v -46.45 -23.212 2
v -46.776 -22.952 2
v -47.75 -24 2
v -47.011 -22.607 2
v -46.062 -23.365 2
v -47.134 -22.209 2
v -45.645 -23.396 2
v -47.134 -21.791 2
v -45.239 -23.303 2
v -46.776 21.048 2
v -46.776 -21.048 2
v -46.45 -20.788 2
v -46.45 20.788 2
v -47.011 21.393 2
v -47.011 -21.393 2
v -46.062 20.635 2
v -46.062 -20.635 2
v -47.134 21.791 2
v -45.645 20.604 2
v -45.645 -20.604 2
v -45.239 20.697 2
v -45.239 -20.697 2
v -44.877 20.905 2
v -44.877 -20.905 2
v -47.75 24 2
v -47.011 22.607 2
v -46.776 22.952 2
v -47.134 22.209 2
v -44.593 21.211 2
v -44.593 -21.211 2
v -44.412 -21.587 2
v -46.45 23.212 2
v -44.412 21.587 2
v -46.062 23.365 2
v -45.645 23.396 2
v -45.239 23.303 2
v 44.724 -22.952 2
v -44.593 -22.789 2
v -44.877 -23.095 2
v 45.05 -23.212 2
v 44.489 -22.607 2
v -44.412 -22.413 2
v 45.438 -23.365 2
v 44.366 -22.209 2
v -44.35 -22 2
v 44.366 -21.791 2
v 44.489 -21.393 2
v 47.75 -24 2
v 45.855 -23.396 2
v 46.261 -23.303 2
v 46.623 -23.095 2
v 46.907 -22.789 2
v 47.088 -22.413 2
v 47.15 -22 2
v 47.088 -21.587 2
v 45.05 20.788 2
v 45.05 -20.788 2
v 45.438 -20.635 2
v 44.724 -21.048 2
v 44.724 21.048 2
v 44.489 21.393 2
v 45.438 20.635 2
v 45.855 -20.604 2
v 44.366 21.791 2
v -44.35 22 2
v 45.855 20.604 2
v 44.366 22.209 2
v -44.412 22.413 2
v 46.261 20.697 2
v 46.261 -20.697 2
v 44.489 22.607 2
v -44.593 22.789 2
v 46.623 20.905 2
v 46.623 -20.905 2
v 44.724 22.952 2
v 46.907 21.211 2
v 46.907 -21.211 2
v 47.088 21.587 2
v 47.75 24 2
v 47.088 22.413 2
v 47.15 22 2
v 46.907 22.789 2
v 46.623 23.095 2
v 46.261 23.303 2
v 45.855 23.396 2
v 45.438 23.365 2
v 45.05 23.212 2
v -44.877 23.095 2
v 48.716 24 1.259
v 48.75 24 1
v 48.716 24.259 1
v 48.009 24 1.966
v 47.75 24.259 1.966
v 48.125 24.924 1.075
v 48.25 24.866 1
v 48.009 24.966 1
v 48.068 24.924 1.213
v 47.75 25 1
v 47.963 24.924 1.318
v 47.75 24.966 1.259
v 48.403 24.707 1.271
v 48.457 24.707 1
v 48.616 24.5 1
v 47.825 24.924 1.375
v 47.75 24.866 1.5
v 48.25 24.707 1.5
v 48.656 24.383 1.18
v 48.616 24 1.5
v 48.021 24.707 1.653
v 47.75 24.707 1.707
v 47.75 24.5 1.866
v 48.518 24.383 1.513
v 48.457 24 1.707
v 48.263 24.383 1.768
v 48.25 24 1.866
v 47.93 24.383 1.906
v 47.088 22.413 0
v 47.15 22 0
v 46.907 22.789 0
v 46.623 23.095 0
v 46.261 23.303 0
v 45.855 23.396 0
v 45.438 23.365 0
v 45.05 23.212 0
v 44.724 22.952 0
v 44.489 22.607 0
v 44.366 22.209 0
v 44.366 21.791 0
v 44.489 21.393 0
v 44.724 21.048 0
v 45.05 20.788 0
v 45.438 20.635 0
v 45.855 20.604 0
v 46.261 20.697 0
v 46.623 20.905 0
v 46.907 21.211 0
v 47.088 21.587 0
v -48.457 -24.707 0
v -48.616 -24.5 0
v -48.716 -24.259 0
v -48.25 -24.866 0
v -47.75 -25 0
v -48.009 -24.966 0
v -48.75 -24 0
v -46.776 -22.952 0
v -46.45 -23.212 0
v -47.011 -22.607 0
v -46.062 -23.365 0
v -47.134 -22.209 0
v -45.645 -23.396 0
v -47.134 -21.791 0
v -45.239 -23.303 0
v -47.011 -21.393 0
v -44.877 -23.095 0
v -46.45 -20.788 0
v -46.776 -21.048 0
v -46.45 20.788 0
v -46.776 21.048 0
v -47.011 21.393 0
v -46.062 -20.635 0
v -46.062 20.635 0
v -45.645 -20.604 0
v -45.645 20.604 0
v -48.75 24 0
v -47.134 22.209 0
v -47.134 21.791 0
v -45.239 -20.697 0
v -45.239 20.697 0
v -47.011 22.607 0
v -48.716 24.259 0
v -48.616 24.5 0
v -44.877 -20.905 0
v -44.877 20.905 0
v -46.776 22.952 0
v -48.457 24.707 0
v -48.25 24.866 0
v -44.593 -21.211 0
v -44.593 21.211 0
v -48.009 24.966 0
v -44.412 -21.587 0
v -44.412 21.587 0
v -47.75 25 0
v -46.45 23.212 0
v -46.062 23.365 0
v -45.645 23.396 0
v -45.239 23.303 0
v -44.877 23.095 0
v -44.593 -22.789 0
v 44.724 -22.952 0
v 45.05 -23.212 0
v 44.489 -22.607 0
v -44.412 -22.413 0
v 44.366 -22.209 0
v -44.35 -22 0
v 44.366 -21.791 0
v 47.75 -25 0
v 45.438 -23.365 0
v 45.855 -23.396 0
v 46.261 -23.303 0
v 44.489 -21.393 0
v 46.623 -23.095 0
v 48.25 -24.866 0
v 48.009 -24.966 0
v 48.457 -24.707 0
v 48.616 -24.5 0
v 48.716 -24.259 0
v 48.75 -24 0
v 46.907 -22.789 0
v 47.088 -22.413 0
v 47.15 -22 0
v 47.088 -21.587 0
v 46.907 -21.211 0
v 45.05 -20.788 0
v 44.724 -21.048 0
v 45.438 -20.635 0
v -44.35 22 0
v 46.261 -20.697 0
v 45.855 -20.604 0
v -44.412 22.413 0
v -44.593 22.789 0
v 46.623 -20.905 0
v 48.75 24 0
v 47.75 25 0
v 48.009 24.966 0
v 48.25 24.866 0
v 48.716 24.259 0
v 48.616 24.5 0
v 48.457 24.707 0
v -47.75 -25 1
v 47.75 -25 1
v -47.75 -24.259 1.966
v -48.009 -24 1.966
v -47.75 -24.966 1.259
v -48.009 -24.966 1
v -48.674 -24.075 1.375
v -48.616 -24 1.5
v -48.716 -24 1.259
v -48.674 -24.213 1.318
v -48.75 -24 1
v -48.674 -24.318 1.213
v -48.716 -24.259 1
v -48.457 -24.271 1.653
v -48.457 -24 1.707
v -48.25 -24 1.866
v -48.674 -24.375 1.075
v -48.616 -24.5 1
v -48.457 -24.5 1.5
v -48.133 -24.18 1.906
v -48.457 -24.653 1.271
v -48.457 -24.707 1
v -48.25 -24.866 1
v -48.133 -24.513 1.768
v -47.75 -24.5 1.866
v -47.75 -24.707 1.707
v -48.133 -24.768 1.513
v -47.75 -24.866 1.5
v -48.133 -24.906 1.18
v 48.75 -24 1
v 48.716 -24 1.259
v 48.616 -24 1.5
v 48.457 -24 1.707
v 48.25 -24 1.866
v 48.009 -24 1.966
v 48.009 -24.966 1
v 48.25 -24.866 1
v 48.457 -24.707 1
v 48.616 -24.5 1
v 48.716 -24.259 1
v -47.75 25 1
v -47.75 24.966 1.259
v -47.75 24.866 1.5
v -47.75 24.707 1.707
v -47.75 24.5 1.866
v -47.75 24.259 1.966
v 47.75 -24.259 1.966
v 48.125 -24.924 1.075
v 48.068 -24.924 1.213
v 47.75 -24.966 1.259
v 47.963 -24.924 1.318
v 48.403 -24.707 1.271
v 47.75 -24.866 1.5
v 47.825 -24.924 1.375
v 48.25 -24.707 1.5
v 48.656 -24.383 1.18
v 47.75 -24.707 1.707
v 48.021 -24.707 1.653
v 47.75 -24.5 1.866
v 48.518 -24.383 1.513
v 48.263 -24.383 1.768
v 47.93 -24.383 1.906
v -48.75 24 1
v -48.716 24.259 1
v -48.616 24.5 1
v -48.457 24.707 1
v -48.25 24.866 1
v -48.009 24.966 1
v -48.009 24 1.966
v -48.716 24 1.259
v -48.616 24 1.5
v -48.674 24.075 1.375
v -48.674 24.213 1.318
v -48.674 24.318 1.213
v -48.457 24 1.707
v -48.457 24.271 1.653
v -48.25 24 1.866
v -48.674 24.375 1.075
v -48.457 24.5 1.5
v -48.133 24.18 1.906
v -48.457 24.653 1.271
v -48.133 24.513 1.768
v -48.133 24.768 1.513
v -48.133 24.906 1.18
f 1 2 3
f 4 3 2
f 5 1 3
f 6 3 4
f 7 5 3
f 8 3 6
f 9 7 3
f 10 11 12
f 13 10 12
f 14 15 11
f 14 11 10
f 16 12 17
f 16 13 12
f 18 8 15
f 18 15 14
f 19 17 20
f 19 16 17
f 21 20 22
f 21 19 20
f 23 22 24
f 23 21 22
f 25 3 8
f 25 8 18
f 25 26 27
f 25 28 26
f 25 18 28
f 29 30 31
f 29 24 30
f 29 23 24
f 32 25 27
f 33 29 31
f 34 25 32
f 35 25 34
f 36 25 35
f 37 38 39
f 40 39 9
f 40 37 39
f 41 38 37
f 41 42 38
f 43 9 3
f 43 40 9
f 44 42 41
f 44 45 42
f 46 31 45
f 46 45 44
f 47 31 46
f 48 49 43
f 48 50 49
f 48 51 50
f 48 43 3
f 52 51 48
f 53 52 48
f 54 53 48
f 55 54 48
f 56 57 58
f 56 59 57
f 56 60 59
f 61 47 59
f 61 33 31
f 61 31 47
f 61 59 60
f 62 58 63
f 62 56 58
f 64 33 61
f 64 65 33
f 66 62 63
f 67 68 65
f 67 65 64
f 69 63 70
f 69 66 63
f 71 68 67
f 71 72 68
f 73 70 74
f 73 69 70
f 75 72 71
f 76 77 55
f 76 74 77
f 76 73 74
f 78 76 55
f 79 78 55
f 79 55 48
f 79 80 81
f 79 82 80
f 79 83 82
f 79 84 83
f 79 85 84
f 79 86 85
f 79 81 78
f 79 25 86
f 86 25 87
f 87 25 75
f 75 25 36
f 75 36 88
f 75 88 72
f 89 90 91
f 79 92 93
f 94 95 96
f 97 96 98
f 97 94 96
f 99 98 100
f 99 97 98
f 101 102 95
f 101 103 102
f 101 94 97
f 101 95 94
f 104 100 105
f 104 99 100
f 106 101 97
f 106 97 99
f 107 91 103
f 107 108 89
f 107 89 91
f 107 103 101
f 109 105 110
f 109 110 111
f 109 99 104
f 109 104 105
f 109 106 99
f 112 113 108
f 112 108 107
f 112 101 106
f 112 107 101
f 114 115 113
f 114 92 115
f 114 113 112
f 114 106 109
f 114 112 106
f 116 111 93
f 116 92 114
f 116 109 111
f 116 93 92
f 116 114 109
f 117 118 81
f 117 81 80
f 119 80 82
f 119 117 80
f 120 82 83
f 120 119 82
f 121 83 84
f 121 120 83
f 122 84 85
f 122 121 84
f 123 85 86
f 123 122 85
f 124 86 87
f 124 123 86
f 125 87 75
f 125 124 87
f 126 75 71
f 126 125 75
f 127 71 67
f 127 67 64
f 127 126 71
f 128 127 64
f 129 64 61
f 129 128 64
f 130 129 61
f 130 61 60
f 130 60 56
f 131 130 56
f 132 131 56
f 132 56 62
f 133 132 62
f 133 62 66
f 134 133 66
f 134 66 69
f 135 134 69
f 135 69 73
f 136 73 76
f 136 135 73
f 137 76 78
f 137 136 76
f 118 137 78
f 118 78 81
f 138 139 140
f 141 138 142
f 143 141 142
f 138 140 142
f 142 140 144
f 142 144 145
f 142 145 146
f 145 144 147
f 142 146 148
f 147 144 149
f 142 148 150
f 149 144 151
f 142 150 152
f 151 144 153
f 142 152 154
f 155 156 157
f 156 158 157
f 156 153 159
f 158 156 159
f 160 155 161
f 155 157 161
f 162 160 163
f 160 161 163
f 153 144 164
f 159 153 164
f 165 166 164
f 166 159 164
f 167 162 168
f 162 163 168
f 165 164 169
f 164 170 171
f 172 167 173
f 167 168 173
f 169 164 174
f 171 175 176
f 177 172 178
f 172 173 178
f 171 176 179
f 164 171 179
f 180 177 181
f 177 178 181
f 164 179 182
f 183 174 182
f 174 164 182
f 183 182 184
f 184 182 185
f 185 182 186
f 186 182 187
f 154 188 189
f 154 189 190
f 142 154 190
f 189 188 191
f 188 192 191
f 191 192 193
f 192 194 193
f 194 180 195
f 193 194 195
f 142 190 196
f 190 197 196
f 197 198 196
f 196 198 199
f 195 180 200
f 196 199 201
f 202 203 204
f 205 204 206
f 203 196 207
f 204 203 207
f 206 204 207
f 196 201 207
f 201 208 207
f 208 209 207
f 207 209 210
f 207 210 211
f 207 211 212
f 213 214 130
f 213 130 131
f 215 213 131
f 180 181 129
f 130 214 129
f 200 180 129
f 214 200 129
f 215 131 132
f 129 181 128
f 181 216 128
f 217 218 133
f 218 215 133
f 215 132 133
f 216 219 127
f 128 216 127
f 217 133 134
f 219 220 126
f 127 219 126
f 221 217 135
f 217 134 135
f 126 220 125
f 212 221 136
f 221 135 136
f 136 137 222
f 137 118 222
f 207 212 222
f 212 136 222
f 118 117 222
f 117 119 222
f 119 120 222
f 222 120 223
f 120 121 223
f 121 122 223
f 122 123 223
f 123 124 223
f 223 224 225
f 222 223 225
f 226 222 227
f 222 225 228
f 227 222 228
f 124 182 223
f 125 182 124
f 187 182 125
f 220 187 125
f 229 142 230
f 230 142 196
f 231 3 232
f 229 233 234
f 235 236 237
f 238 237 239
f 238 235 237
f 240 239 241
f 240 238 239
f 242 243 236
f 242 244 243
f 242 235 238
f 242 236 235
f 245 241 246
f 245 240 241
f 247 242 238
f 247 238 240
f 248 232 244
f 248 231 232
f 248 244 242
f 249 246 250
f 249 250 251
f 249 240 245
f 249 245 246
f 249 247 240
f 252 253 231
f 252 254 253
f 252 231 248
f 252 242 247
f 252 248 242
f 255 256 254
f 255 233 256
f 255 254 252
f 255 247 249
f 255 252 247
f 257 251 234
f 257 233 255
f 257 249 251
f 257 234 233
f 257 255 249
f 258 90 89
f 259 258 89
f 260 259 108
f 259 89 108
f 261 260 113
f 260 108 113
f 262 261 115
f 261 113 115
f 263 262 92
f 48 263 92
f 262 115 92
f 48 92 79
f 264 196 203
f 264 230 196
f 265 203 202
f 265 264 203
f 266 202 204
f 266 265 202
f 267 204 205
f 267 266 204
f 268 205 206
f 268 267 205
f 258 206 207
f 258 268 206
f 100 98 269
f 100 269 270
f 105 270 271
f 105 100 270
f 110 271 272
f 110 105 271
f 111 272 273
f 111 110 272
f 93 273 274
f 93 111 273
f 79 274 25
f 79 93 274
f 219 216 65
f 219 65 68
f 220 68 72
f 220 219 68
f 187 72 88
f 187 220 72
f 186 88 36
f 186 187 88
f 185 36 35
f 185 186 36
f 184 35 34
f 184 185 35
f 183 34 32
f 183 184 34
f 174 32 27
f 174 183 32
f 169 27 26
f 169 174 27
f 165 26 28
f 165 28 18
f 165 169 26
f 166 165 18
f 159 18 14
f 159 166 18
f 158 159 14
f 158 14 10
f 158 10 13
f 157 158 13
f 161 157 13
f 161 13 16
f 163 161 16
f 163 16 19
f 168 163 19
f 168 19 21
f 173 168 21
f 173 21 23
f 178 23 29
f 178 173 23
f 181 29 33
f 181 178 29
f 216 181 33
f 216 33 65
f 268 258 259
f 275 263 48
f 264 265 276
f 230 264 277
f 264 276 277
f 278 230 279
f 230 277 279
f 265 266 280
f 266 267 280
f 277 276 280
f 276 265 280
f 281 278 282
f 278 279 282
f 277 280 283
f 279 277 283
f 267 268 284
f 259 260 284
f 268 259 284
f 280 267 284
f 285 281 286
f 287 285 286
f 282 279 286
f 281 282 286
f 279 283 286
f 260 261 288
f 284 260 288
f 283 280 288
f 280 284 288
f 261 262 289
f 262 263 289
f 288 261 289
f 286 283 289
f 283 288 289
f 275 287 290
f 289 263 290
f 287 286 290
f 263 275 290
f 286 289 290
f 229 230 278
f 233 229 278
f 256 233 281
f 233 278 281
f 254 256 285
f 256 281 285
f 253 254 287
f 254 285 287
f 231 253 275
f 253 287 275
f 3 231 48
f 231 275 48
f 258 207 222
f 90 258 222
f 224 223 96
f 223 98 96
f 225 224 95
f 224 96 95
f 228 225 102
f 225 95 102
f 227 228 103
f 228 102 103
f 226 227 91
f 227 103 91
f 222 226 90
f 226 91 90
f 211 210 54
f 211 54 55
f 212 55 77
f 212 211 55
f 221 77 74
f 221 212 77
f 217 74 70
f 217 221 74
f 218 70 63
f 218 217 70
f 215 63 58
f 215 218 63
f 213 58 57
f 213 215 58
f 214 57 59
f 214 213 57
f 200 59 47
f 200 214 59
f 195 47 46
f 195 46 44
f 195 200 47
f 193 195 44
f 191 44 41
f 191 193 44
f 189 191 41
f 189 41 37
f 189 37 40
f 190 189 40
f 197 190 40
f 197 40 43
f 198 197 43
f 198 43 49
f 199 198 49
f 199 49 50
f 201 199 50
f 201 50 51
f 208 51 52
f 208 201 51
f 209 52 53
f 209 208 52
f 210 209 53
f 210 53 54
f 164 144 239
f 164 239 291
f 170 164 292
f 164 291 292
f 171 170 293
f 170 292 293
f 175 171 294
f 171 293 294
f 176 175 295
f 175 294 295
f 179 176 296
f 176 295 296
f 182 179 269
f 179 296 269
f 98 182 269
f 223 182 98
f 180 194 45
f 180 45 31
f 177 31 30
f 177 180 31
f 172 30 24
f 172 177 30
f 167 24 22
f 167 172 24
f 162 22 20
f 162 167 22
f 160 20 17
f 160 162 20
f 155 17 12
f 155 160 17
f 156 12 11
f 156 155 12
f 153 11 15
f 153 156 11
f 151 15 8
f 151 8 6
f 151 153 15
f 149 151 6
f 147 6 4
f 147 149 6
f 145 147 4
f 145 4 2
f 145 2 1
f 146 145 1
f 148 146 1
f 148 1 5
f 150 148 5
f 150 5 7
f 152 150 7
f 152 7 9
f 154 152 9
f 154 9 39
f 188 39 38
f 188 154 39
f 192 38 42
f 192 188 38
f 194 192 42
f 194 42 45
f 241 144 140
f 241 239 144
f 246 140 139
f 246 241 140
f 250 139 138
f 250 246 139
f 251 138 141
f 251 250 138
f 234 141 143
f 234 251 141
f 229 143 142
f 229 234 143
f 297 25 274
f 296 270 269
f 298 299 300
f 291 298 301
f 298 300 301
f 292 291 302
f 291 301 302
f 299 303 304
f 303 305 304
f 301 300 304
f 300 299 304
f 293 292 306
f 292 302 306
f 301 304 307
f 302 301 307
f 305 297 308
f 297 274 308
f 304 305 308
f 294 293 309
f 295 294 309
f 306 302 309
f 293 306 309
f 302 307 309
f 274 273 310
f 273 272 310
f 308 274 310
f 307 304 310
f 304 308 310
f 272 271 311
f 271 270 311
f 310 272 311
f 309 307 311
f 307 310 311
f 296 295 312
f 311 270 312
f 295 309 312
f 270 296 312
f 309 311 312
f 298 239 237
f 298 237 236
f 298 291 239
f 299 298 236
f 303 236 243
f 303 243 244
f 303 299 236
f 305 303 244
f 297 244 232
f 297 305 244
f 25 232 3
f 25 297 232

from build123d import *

# Parameters (mm, degrees)
SKETCH_W  = 97.5
SKETCH_H  = 50
SKETCH_R  = 1.4
PAD_DEPTH = 2
FILLET_R  = 1


with BuildPart() as part:
    # Sketch → Pad (new body)
    with BuildSketch(Plane.XY):
        Rectangle(SKETCH_W, SKETCH_H)
        with Locations((-45.75, 22)):
            Circle(SKETCH_R, mode=Mode.SUBTRACT)
        with Locations((45.75, 22)):
            Circle(SKETCH_R, mode=Mode.SUBTRACT)
        with Locations((45.75, -22)):
            Circle(SKETCH_R, mode=Mode.SUBTRACT)
        with Locations((-45.75, -22)):
            Circle(SKETCH_R, mode=Mode.SUBTRACT)
    extrude(amount=PAD_DEPTH)

    # Fillet
    fillet_edges = [part.edges().sort_by_distance(p)[0] for p in [
        (48.75, 0, 2),
        (48.75, 25, 1),
        (48.75, -25, 1),
        (0, -25, 2),
        (0, 25, 2),
        (-48.75, 0, 2),
        (-48.75, 25, 1),
        (-48.75, -25, 1),
    ]]
    fillet(fillet_edges, radius=FILLET_R)


solid = part.part
